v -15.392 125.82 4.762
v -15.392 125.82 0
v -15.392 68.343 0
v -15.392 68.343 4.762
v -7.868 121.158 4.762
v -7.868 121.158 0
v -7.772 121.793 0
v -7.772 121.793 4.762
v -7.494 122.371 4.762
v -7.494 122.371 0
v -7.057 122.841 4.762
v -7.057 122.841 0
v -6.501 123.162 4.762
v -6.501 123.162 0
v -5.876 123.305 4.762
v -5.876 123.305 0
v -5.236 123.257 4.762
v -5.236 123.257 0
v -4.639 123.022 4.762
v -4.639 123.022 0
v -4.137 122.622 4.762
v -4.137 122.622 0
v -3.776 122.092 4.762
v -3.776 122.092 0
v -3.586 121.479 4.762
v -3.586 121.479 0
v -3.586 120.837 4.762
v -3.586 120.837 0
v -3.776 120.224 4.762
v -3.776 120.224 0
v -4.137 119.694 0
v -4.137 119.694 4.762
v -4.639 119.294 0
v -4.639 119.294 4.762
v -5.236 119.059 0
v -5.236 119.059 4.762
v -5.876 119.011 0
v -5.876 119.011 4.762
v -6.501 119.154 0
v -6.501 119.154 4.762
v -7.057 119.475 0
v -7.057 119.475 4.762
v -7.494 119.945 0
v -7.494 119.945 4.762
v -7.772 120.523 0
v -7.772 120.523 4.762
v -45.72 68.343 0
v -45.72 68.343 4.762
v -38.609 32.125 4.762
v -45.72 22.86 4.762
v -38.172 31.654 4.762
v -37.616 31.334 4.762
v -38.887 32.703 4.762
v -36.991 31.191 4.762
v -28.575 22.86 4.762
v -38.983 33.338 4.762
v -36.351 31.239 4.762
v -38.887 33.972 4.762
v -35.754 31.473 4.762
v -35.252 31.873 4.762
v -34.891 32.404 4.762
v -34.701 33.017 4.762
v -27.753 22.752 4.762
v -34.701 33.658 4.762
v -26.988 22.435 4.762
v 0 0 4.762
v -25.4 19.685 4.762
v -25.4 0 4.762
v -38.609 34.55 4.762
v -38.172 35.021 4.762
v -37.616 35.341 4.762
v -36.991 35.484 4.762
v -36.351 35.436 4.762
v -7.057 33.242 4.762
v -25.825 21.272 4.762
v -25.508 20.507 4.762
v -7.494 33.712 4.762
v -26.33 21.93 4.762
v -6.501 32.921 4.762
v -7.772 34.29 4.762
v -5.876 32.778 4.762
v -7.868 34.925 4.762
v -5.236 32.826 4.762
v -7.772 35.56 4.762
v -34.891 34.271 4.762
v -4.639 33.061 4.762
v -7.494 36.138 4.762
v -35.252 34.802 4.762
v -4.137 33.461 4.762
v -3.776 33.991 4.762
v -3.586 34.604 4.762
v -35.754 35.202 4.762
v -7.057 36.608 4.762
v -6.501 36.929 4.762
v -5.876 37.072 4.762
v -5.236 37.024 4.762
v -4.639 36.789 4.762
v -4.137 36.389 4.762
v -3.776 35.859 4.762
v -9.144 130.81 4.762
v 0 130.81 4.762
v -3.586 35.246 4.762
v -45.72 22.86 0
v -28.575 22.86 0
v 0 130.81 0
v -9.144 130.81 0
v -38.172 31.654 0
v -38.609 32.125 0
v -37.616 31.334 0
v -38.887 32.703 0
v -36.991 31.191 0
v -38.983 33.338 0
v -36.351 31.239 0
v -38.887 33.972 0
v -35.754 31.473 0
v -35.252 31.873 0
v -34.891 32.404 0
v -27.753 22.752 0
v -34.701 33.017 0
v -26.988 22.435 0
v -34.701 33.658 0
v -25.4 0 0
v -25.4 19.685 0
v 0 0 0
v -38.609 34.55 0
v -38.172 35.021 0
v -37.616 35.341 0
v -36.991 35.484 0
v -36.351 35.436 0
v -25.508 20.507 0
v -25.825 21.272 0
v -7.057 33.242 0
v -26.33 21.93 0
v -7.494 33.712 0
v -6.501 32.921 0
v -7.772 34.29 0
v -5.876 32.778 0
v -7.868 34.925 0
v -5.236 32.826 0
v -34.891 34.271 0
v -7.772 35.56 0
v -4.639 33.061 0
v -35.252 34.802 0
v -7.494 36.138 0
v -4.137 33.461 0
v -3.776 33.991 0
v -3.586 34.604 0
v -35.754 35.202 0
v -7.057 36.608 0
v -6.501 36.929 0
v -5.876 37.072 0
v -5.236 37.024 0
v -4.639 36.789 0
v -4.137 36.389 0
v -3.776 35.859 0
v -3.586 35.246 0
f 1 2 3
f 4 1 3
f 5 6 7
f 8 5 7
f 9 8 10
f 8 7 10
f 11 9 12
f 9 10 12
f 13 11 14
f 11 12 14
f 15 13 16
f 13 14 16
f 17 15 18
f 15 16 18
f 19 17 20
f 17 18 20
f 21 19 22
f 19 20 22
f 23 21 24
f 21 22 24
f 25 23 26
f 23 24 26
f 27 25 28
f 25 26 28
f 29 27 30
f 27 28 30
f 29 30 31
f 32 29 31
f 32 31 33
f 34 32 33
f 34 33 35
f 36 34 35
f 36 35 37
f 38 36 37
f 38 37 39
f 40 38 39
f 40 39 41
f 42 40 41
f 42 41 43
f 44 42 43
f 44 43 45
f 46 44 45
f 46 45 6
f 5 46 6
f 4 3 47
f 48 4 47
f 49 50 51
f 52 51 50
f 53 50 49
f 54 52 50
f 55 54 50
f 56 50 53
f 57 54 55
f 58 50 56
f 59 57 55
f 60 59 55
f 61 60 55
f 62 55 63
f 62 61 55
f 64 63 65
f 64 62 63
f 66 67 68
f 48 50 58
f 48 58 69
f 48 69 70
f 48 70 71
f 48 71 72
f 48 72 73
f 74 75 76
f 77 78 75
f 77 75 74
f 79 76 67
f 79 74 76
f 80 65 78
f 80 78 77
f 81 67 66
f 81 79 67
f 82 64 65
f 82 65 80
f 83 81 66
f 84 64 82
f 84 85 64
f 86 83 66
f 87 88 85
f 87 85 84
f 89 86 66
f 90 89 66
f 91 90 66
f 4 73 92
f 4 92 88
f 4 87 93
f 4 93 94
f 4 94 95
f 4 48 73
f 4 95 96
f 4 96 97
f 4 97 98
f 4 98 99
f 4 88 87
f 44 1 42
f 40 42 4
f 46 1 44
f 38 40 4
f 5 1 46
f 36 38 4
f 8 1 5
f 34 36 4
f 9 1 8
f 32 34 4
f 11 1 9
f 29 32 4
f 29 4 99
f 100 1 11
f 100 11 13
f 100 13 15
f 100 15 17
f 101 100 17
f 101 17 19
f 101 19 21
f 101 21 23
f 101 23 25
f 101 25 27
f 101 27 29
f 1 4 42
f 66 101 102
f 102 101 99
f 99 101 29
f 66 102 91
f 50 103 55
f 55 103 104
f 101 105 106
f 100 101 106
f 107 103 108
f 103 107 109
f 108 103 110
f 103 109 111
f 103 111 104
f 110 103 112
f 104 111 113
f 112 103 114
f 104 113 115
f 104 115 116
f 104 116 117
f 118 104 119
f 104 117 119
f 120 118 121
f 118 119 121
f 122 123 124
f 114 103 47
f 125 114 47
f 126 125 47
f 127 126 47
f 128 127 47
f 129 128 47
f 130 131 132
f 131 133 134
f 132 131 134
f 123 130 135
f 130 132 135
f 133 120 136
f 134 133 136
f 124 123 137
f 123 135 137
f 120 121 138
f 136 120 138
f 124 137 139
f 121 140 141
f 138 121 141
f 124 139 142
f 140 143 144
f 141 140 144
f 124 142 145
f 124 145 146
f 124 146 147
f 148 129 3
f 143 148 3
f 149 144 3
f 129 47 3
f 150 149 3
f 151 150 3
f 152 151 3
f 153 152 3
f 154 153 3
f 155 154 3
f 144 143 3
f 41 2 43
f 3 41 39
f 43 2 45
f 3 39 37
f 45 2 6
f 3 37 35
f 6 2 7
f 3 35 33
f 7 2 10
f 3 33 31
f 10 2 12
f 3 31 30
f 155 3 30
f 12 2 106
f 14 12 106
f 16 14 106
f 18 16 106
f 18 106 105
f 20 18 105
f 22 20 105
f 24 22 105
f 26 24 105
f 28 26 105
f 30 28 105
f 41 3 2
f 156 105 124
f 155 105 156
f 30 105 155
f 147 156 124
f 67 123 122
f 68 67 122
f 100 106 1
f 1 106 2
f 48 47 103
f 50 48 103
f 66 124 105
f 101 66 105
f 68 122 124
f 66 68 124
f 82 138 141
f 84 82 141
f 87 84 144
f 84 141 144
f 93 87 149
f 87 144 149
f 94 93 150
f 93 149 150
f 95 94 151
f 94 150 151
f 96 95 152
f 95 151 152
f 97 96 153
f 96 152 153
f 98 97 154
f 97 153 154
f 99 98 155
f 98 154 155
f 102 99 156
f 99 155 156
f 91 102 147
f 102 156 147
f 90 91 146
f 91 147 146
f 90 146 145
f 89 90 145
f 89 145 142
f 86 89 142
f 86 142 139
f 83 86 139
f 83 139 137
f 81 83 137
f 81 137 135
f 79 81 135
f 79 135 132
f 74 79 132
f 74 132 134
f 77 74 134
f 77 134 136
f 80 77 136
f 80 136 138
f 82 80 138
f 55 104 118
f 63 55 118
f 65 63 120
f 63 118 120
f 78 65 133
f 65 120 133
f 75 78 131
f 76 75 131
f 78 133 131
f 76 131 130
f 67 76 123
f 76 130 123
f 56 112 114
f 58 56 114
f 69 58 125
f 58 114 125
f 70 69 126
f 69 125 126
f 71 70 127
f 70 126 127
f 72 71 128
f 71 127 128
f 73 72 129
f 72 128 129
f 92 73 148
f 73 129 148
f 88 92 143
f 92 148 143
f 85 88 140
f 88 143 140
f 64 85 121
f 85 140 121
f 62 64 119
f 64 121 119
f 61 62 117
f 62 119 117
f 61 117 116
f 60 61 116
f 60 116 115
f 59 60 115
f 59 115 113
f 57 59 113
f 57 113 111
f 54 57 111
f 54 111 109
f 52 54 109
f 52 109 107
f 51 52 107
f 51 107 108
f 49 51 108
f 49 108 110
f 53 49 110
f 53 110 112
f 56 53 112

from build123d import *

# Parameters (mm, degrees)
BOSS_EXTRUDE1_DEPTH = 4.7625
SKETCH3_R           = 2.15265
CUT_EXTRUDE1_DEPTH  = 139.651562942


with BuildPart() as part:
    # Sketch1 → Boss-Extrude1 (new body)
    with BuildSketch(Plane.XY):
        with BuildLine():
            Line((-15.392138512, 125.820167161), (-15.392138512, 68.343175012))
            Line((-15.392138512, 68.343175012), (-45.72, 68.343175012))
            Line((-45.72, 68.343175012), (-45.72, 22.86))
            Line((-45.72, 22.86), (-28.575, 22.86))
            ThreePointArc((-28.575, 22.86), (-26.32993597, 21.93006403), (-25.4, 19.685))
            Line((-25.4, 19.685), (-25.4, 0))
            Line((-25.4, 0), (0, 0))
            Line((0, 0), (0, 130.81))
            Line((0, 130.81), (-9.144, 130.81))
            Line((-9.144, 130.81), (-15.392138512, 125.820167161))
        make_face()
    extrude(amount=BOSS_EXTRUDE1_DEPTH)

    # Sketch3 → Cut-Extrude1 (cut, through all)
    with BuildSketch(Plane(origin=(0, 0, 0), x_dir=(-1, 0, 0), z_dir=(0, 0, -1))):
        with Locations((5.715, 121.158)):
            Circle(SKETCH3_R)
        with Locations((5.715, 34.925)):
            Circle(SKETCH3_R)
        with Locations((36.83, 33.3375)):
            Circle(SKETCH3_R)
    extrude(amount=-CUT_EXTRUDE1_DEPTH, mode=Mode.SUBTRACT)


solid = part.part
